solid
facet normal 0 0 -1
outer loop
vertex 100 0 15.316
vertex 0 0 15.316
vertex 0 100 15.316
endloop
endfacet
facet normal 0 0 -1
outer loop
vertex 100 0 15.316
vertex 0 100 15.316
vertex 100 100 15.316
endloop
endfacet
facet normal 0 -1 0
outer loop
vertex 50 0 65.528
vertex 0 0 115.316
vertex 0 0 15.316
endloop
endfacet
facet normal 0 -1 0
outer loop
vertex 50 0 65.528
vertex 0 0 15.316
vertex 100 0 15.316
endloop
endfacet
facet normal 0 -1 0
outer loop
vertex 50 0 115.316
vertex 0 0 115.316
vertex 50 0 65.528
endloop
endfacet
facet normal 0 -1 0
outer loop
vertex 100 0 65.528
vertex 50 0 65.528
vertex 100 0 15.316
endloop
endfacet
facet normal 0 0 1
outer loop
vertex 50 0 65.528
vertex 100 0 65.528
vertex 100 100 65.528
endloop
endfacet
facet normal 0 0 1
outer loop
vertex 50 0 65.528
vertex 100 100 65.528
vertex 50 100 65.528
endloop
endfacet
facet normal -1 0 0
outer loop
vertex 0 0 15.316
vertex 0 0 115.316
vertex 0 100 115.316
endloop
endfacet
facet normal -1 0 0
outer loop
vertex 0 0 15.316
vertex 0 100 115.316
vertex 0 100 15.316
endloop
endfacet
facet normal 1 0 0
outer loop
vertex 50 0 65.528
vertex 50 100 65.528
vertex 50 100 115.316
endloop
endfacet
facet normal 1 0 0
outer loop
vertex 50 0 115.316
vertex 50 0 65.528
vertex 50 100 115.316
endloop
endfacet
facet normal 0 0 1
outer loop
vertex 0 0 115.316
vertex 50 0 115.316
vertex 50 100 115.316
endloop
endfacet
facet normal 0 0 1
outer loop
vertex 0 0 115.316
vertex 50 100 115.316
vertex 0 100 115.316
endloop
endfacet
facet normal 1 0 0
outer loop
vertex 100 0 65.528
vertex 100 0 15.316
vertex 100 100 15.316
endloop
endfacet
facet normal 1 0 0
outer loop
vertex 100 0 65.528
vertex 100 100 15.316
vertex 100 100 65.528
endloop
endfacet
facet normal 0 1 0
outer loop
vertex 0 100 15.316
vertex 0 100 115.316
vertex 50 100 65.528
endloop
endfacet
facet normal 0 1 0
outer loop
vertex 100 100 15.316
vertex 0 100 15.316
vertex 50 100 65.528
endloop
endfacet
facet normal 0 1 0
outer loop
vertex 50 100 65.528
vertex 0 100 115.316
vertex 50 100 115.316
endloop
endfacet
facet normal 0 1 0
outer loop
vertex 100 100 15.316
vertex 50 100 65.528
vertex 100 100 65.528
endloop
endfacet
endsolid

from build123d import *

# Parameters (mm, degrees)
F1_DEPTH = 100


# Not quite as in the source:
# - a feature names something its author has since deleted; it is built from what else it names


with BuildPart() as f1:
    # F0 (on Front) → F1 (new body)
    with BuildSketch(Plane.XZ):
        Polygon((50, 115.3164558689), (0, 115.3164558689), (0, 15.3164558689), (100, 15.3164558689), (100, 65.5276626348), (50, 65.5276626348), align=None)
    extrude(amount=-F1_DEPTH)


solid = f1.part
